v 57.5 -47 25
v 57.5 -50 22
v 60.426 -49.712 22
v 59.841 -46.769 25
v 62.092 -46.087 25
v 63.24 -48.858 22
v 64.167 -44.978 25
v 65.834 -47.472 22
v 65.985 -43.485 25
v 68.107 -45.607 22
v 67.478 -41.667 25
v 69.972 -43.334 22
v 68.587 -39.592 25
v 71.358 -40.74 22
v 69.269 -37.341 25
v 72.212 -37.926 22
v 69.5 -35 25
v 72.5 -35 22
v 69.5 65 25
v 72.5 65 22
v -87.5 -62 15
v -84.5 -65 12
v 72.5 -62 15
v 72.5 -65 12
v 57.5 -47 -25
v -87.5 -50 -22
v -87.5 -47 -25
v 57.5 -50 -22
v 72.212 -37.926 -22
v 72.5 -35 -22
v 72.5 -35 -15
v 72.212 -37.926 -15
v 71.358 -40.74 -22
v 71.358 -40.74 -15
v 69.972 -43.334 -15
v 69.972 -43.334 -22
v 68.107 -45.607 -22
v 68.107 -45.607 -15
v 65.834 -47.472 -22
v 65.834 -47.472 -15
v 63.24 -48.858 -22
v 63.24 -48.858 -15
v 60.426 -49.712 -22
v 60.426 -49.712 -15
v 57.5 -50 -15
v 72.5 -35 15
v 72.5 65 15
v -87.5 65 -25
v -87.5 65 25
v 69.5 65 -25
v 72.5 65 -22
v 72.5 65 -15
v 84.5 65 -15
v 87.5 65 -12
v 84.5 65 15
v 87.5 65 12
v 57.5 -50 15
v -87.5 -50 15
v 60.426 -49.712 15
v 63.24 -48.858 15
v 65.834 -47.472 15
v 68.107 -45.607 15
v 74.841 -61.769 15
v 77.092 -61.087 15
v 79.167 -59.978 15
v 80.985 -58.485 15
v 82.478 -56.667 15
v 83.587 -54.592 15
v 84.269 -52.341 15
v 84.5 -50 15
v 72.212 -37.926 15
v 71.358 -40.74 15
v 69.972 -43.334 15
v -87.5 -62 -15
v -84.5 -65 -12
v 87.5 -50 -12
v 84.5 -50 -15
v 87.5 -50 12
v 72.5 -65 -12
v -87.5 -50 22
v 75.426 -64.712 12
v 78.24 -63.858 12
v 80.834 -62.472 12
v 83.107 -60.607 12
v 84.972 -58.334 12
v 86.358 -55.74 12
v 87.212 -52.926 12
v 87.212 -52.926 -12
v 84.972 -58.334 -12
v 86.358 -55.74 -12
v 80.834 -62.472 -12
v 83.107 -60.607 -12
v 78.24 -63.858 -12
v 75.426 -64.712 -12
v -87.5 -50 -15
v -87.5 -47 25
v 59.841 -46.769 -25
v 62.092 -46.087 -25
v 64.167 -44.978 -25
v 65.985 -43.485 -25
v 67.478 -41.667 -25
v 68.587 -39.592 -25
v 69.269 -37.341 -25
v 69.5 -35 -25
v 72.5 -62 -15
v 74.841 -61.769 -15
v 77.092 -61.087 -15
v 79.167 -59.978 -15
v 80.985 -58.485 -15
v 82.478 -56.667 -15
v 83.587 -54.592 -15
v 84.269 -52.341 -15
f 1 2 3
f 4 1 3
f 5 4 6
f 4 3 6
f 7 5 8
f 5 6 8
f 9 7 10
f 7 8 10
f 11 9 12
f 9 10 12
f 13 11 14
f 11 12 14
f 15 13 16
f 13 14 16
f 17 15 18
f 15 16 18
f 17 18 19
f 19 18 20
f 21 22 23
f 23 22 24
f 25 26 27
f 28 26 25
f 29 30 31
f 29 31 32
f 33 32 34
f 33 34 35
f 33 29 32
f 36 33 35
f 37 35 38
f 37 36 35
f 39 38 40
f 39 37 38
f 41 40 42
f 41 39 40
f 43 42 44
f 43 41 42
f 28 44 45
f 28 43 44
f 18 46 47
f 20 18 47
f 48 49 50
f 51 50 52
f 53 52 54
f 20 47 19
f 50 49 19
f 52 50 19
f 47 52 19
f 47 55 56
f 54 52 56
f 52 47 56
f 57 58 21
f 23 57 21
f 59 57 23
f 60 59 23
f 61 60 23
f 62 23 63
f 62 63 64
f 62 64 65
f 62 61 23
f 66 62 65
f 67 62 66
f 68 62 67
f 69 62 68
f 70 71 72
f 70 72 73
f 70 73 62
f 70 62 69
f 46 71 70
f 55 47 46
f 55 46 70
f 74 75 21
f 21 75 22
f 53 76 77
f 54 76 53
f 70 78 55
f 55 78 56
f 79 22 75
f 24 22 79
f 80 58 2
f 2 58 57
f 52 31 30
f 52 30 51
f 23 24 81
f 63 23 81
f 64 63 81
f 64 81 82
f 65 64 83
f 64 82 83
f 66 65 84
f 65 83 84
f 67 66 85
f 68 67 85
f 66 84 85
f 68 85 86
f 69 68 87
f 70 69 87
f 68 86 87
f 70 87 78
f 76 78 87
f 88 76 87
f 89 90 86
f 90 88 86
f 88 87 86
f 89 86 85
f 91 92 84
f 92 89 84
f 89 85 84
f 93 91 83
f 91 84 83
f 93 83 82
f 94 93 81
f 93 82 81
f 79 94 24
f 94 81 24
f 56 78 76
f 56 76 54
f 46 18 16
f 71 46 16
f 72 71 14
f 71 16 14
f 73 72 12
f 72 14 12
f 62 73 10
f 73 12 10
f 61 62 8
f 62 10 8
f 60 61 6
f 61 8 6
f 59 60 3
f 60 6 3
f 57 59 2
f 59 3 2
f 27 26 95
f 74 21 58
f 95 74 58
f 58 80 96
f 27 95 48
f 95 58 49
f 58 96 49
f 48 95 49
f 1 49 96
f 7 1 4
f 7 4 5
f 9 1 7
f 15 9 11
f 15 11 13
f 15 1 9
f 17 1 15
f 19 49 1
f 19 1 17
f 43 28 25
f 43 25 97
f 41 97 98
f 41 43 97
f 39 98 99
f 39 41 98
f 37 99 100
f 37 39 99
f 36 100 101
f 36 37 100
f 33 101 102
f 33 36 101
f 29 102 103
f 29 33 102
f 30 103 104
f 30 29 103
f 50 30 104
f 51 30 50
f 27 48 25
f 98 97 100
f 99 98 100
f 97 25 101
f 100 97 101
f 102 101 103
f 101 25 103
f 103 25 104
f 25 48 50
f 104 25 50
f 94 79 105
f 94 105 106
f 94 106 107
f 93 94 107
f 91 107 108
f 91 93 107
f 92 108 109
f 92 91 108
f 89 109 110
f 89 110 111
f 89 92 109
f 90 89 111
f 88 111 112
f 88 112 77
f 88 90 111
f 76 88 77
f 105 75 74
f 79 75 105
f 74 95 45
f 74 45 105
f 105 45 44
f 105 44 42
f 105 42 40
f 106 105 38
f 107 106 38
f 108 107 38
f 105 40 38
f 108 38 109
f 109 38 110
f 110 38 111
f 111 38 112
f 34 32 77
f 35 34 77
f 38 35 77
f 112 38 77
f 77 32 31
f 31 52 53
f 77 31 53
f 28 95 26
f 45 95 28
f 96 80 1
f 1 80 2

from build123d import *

# Parameters (mm, degrees)
F0_W          = 175
F0_H          = 130
F1_DEPTH      = 15
F1_DEPTH_BACK = 15
F2_W          = 160
F2_H          = 115
F3_DEPTH      = 25
F3_DEPTH_BACK = 25
F4_R          = 15
F5_SIZE       = 3


with BuildPart() as f1:
    # F0 (on Top) → F1 (new body, two sides)
    with BuildSketch(Plane.XY) as f1_sk:
        Rectangle(F0_W, F0_H)
    extrude(amount=F1_DEPTH)
    extrude(f1_sk.sketch, amount=-F1_DEPTH_BACK)

    # F2 (on Top) → F3 (join, two sides)
    with BuildSketch(Plane.XY) as f3_sk:
        with Locations((-7.5, 7.5)):
            Rectangle(F2_W, F2_H)
    extrude(amount=F3_DEPTH)
    extrude(f3_sk.sketch, amount=-F3_DEPTH_BACK)

    # F4
    f4_edges = [f1.edges().sort_by_distance(p)[0] for p in [
        (87.5, -65, 0),
        (72.5, -50, 20),
        (72.5, -50, -20),
    ]]
    fillet(f4_edges, radius=F4_R)

    # F5
    f5_edges = [f1.edges().sort_by_distance(p)[0] for p in [
        (72.5, 15, 25),
        (68.106602, -45.606602, 25),
        (-15, -50, 25),
        (-7.5, -65, 15),
        (72.5, -65, 0),
        (-87.5, -65, 0),
        (-7.5, -65, -15),
        (-15, -50, -25),
        (72.5, 15, -25),
    ]]
    chamfer(f5_edges, length=F5_SIZE)


solid = f1.part
